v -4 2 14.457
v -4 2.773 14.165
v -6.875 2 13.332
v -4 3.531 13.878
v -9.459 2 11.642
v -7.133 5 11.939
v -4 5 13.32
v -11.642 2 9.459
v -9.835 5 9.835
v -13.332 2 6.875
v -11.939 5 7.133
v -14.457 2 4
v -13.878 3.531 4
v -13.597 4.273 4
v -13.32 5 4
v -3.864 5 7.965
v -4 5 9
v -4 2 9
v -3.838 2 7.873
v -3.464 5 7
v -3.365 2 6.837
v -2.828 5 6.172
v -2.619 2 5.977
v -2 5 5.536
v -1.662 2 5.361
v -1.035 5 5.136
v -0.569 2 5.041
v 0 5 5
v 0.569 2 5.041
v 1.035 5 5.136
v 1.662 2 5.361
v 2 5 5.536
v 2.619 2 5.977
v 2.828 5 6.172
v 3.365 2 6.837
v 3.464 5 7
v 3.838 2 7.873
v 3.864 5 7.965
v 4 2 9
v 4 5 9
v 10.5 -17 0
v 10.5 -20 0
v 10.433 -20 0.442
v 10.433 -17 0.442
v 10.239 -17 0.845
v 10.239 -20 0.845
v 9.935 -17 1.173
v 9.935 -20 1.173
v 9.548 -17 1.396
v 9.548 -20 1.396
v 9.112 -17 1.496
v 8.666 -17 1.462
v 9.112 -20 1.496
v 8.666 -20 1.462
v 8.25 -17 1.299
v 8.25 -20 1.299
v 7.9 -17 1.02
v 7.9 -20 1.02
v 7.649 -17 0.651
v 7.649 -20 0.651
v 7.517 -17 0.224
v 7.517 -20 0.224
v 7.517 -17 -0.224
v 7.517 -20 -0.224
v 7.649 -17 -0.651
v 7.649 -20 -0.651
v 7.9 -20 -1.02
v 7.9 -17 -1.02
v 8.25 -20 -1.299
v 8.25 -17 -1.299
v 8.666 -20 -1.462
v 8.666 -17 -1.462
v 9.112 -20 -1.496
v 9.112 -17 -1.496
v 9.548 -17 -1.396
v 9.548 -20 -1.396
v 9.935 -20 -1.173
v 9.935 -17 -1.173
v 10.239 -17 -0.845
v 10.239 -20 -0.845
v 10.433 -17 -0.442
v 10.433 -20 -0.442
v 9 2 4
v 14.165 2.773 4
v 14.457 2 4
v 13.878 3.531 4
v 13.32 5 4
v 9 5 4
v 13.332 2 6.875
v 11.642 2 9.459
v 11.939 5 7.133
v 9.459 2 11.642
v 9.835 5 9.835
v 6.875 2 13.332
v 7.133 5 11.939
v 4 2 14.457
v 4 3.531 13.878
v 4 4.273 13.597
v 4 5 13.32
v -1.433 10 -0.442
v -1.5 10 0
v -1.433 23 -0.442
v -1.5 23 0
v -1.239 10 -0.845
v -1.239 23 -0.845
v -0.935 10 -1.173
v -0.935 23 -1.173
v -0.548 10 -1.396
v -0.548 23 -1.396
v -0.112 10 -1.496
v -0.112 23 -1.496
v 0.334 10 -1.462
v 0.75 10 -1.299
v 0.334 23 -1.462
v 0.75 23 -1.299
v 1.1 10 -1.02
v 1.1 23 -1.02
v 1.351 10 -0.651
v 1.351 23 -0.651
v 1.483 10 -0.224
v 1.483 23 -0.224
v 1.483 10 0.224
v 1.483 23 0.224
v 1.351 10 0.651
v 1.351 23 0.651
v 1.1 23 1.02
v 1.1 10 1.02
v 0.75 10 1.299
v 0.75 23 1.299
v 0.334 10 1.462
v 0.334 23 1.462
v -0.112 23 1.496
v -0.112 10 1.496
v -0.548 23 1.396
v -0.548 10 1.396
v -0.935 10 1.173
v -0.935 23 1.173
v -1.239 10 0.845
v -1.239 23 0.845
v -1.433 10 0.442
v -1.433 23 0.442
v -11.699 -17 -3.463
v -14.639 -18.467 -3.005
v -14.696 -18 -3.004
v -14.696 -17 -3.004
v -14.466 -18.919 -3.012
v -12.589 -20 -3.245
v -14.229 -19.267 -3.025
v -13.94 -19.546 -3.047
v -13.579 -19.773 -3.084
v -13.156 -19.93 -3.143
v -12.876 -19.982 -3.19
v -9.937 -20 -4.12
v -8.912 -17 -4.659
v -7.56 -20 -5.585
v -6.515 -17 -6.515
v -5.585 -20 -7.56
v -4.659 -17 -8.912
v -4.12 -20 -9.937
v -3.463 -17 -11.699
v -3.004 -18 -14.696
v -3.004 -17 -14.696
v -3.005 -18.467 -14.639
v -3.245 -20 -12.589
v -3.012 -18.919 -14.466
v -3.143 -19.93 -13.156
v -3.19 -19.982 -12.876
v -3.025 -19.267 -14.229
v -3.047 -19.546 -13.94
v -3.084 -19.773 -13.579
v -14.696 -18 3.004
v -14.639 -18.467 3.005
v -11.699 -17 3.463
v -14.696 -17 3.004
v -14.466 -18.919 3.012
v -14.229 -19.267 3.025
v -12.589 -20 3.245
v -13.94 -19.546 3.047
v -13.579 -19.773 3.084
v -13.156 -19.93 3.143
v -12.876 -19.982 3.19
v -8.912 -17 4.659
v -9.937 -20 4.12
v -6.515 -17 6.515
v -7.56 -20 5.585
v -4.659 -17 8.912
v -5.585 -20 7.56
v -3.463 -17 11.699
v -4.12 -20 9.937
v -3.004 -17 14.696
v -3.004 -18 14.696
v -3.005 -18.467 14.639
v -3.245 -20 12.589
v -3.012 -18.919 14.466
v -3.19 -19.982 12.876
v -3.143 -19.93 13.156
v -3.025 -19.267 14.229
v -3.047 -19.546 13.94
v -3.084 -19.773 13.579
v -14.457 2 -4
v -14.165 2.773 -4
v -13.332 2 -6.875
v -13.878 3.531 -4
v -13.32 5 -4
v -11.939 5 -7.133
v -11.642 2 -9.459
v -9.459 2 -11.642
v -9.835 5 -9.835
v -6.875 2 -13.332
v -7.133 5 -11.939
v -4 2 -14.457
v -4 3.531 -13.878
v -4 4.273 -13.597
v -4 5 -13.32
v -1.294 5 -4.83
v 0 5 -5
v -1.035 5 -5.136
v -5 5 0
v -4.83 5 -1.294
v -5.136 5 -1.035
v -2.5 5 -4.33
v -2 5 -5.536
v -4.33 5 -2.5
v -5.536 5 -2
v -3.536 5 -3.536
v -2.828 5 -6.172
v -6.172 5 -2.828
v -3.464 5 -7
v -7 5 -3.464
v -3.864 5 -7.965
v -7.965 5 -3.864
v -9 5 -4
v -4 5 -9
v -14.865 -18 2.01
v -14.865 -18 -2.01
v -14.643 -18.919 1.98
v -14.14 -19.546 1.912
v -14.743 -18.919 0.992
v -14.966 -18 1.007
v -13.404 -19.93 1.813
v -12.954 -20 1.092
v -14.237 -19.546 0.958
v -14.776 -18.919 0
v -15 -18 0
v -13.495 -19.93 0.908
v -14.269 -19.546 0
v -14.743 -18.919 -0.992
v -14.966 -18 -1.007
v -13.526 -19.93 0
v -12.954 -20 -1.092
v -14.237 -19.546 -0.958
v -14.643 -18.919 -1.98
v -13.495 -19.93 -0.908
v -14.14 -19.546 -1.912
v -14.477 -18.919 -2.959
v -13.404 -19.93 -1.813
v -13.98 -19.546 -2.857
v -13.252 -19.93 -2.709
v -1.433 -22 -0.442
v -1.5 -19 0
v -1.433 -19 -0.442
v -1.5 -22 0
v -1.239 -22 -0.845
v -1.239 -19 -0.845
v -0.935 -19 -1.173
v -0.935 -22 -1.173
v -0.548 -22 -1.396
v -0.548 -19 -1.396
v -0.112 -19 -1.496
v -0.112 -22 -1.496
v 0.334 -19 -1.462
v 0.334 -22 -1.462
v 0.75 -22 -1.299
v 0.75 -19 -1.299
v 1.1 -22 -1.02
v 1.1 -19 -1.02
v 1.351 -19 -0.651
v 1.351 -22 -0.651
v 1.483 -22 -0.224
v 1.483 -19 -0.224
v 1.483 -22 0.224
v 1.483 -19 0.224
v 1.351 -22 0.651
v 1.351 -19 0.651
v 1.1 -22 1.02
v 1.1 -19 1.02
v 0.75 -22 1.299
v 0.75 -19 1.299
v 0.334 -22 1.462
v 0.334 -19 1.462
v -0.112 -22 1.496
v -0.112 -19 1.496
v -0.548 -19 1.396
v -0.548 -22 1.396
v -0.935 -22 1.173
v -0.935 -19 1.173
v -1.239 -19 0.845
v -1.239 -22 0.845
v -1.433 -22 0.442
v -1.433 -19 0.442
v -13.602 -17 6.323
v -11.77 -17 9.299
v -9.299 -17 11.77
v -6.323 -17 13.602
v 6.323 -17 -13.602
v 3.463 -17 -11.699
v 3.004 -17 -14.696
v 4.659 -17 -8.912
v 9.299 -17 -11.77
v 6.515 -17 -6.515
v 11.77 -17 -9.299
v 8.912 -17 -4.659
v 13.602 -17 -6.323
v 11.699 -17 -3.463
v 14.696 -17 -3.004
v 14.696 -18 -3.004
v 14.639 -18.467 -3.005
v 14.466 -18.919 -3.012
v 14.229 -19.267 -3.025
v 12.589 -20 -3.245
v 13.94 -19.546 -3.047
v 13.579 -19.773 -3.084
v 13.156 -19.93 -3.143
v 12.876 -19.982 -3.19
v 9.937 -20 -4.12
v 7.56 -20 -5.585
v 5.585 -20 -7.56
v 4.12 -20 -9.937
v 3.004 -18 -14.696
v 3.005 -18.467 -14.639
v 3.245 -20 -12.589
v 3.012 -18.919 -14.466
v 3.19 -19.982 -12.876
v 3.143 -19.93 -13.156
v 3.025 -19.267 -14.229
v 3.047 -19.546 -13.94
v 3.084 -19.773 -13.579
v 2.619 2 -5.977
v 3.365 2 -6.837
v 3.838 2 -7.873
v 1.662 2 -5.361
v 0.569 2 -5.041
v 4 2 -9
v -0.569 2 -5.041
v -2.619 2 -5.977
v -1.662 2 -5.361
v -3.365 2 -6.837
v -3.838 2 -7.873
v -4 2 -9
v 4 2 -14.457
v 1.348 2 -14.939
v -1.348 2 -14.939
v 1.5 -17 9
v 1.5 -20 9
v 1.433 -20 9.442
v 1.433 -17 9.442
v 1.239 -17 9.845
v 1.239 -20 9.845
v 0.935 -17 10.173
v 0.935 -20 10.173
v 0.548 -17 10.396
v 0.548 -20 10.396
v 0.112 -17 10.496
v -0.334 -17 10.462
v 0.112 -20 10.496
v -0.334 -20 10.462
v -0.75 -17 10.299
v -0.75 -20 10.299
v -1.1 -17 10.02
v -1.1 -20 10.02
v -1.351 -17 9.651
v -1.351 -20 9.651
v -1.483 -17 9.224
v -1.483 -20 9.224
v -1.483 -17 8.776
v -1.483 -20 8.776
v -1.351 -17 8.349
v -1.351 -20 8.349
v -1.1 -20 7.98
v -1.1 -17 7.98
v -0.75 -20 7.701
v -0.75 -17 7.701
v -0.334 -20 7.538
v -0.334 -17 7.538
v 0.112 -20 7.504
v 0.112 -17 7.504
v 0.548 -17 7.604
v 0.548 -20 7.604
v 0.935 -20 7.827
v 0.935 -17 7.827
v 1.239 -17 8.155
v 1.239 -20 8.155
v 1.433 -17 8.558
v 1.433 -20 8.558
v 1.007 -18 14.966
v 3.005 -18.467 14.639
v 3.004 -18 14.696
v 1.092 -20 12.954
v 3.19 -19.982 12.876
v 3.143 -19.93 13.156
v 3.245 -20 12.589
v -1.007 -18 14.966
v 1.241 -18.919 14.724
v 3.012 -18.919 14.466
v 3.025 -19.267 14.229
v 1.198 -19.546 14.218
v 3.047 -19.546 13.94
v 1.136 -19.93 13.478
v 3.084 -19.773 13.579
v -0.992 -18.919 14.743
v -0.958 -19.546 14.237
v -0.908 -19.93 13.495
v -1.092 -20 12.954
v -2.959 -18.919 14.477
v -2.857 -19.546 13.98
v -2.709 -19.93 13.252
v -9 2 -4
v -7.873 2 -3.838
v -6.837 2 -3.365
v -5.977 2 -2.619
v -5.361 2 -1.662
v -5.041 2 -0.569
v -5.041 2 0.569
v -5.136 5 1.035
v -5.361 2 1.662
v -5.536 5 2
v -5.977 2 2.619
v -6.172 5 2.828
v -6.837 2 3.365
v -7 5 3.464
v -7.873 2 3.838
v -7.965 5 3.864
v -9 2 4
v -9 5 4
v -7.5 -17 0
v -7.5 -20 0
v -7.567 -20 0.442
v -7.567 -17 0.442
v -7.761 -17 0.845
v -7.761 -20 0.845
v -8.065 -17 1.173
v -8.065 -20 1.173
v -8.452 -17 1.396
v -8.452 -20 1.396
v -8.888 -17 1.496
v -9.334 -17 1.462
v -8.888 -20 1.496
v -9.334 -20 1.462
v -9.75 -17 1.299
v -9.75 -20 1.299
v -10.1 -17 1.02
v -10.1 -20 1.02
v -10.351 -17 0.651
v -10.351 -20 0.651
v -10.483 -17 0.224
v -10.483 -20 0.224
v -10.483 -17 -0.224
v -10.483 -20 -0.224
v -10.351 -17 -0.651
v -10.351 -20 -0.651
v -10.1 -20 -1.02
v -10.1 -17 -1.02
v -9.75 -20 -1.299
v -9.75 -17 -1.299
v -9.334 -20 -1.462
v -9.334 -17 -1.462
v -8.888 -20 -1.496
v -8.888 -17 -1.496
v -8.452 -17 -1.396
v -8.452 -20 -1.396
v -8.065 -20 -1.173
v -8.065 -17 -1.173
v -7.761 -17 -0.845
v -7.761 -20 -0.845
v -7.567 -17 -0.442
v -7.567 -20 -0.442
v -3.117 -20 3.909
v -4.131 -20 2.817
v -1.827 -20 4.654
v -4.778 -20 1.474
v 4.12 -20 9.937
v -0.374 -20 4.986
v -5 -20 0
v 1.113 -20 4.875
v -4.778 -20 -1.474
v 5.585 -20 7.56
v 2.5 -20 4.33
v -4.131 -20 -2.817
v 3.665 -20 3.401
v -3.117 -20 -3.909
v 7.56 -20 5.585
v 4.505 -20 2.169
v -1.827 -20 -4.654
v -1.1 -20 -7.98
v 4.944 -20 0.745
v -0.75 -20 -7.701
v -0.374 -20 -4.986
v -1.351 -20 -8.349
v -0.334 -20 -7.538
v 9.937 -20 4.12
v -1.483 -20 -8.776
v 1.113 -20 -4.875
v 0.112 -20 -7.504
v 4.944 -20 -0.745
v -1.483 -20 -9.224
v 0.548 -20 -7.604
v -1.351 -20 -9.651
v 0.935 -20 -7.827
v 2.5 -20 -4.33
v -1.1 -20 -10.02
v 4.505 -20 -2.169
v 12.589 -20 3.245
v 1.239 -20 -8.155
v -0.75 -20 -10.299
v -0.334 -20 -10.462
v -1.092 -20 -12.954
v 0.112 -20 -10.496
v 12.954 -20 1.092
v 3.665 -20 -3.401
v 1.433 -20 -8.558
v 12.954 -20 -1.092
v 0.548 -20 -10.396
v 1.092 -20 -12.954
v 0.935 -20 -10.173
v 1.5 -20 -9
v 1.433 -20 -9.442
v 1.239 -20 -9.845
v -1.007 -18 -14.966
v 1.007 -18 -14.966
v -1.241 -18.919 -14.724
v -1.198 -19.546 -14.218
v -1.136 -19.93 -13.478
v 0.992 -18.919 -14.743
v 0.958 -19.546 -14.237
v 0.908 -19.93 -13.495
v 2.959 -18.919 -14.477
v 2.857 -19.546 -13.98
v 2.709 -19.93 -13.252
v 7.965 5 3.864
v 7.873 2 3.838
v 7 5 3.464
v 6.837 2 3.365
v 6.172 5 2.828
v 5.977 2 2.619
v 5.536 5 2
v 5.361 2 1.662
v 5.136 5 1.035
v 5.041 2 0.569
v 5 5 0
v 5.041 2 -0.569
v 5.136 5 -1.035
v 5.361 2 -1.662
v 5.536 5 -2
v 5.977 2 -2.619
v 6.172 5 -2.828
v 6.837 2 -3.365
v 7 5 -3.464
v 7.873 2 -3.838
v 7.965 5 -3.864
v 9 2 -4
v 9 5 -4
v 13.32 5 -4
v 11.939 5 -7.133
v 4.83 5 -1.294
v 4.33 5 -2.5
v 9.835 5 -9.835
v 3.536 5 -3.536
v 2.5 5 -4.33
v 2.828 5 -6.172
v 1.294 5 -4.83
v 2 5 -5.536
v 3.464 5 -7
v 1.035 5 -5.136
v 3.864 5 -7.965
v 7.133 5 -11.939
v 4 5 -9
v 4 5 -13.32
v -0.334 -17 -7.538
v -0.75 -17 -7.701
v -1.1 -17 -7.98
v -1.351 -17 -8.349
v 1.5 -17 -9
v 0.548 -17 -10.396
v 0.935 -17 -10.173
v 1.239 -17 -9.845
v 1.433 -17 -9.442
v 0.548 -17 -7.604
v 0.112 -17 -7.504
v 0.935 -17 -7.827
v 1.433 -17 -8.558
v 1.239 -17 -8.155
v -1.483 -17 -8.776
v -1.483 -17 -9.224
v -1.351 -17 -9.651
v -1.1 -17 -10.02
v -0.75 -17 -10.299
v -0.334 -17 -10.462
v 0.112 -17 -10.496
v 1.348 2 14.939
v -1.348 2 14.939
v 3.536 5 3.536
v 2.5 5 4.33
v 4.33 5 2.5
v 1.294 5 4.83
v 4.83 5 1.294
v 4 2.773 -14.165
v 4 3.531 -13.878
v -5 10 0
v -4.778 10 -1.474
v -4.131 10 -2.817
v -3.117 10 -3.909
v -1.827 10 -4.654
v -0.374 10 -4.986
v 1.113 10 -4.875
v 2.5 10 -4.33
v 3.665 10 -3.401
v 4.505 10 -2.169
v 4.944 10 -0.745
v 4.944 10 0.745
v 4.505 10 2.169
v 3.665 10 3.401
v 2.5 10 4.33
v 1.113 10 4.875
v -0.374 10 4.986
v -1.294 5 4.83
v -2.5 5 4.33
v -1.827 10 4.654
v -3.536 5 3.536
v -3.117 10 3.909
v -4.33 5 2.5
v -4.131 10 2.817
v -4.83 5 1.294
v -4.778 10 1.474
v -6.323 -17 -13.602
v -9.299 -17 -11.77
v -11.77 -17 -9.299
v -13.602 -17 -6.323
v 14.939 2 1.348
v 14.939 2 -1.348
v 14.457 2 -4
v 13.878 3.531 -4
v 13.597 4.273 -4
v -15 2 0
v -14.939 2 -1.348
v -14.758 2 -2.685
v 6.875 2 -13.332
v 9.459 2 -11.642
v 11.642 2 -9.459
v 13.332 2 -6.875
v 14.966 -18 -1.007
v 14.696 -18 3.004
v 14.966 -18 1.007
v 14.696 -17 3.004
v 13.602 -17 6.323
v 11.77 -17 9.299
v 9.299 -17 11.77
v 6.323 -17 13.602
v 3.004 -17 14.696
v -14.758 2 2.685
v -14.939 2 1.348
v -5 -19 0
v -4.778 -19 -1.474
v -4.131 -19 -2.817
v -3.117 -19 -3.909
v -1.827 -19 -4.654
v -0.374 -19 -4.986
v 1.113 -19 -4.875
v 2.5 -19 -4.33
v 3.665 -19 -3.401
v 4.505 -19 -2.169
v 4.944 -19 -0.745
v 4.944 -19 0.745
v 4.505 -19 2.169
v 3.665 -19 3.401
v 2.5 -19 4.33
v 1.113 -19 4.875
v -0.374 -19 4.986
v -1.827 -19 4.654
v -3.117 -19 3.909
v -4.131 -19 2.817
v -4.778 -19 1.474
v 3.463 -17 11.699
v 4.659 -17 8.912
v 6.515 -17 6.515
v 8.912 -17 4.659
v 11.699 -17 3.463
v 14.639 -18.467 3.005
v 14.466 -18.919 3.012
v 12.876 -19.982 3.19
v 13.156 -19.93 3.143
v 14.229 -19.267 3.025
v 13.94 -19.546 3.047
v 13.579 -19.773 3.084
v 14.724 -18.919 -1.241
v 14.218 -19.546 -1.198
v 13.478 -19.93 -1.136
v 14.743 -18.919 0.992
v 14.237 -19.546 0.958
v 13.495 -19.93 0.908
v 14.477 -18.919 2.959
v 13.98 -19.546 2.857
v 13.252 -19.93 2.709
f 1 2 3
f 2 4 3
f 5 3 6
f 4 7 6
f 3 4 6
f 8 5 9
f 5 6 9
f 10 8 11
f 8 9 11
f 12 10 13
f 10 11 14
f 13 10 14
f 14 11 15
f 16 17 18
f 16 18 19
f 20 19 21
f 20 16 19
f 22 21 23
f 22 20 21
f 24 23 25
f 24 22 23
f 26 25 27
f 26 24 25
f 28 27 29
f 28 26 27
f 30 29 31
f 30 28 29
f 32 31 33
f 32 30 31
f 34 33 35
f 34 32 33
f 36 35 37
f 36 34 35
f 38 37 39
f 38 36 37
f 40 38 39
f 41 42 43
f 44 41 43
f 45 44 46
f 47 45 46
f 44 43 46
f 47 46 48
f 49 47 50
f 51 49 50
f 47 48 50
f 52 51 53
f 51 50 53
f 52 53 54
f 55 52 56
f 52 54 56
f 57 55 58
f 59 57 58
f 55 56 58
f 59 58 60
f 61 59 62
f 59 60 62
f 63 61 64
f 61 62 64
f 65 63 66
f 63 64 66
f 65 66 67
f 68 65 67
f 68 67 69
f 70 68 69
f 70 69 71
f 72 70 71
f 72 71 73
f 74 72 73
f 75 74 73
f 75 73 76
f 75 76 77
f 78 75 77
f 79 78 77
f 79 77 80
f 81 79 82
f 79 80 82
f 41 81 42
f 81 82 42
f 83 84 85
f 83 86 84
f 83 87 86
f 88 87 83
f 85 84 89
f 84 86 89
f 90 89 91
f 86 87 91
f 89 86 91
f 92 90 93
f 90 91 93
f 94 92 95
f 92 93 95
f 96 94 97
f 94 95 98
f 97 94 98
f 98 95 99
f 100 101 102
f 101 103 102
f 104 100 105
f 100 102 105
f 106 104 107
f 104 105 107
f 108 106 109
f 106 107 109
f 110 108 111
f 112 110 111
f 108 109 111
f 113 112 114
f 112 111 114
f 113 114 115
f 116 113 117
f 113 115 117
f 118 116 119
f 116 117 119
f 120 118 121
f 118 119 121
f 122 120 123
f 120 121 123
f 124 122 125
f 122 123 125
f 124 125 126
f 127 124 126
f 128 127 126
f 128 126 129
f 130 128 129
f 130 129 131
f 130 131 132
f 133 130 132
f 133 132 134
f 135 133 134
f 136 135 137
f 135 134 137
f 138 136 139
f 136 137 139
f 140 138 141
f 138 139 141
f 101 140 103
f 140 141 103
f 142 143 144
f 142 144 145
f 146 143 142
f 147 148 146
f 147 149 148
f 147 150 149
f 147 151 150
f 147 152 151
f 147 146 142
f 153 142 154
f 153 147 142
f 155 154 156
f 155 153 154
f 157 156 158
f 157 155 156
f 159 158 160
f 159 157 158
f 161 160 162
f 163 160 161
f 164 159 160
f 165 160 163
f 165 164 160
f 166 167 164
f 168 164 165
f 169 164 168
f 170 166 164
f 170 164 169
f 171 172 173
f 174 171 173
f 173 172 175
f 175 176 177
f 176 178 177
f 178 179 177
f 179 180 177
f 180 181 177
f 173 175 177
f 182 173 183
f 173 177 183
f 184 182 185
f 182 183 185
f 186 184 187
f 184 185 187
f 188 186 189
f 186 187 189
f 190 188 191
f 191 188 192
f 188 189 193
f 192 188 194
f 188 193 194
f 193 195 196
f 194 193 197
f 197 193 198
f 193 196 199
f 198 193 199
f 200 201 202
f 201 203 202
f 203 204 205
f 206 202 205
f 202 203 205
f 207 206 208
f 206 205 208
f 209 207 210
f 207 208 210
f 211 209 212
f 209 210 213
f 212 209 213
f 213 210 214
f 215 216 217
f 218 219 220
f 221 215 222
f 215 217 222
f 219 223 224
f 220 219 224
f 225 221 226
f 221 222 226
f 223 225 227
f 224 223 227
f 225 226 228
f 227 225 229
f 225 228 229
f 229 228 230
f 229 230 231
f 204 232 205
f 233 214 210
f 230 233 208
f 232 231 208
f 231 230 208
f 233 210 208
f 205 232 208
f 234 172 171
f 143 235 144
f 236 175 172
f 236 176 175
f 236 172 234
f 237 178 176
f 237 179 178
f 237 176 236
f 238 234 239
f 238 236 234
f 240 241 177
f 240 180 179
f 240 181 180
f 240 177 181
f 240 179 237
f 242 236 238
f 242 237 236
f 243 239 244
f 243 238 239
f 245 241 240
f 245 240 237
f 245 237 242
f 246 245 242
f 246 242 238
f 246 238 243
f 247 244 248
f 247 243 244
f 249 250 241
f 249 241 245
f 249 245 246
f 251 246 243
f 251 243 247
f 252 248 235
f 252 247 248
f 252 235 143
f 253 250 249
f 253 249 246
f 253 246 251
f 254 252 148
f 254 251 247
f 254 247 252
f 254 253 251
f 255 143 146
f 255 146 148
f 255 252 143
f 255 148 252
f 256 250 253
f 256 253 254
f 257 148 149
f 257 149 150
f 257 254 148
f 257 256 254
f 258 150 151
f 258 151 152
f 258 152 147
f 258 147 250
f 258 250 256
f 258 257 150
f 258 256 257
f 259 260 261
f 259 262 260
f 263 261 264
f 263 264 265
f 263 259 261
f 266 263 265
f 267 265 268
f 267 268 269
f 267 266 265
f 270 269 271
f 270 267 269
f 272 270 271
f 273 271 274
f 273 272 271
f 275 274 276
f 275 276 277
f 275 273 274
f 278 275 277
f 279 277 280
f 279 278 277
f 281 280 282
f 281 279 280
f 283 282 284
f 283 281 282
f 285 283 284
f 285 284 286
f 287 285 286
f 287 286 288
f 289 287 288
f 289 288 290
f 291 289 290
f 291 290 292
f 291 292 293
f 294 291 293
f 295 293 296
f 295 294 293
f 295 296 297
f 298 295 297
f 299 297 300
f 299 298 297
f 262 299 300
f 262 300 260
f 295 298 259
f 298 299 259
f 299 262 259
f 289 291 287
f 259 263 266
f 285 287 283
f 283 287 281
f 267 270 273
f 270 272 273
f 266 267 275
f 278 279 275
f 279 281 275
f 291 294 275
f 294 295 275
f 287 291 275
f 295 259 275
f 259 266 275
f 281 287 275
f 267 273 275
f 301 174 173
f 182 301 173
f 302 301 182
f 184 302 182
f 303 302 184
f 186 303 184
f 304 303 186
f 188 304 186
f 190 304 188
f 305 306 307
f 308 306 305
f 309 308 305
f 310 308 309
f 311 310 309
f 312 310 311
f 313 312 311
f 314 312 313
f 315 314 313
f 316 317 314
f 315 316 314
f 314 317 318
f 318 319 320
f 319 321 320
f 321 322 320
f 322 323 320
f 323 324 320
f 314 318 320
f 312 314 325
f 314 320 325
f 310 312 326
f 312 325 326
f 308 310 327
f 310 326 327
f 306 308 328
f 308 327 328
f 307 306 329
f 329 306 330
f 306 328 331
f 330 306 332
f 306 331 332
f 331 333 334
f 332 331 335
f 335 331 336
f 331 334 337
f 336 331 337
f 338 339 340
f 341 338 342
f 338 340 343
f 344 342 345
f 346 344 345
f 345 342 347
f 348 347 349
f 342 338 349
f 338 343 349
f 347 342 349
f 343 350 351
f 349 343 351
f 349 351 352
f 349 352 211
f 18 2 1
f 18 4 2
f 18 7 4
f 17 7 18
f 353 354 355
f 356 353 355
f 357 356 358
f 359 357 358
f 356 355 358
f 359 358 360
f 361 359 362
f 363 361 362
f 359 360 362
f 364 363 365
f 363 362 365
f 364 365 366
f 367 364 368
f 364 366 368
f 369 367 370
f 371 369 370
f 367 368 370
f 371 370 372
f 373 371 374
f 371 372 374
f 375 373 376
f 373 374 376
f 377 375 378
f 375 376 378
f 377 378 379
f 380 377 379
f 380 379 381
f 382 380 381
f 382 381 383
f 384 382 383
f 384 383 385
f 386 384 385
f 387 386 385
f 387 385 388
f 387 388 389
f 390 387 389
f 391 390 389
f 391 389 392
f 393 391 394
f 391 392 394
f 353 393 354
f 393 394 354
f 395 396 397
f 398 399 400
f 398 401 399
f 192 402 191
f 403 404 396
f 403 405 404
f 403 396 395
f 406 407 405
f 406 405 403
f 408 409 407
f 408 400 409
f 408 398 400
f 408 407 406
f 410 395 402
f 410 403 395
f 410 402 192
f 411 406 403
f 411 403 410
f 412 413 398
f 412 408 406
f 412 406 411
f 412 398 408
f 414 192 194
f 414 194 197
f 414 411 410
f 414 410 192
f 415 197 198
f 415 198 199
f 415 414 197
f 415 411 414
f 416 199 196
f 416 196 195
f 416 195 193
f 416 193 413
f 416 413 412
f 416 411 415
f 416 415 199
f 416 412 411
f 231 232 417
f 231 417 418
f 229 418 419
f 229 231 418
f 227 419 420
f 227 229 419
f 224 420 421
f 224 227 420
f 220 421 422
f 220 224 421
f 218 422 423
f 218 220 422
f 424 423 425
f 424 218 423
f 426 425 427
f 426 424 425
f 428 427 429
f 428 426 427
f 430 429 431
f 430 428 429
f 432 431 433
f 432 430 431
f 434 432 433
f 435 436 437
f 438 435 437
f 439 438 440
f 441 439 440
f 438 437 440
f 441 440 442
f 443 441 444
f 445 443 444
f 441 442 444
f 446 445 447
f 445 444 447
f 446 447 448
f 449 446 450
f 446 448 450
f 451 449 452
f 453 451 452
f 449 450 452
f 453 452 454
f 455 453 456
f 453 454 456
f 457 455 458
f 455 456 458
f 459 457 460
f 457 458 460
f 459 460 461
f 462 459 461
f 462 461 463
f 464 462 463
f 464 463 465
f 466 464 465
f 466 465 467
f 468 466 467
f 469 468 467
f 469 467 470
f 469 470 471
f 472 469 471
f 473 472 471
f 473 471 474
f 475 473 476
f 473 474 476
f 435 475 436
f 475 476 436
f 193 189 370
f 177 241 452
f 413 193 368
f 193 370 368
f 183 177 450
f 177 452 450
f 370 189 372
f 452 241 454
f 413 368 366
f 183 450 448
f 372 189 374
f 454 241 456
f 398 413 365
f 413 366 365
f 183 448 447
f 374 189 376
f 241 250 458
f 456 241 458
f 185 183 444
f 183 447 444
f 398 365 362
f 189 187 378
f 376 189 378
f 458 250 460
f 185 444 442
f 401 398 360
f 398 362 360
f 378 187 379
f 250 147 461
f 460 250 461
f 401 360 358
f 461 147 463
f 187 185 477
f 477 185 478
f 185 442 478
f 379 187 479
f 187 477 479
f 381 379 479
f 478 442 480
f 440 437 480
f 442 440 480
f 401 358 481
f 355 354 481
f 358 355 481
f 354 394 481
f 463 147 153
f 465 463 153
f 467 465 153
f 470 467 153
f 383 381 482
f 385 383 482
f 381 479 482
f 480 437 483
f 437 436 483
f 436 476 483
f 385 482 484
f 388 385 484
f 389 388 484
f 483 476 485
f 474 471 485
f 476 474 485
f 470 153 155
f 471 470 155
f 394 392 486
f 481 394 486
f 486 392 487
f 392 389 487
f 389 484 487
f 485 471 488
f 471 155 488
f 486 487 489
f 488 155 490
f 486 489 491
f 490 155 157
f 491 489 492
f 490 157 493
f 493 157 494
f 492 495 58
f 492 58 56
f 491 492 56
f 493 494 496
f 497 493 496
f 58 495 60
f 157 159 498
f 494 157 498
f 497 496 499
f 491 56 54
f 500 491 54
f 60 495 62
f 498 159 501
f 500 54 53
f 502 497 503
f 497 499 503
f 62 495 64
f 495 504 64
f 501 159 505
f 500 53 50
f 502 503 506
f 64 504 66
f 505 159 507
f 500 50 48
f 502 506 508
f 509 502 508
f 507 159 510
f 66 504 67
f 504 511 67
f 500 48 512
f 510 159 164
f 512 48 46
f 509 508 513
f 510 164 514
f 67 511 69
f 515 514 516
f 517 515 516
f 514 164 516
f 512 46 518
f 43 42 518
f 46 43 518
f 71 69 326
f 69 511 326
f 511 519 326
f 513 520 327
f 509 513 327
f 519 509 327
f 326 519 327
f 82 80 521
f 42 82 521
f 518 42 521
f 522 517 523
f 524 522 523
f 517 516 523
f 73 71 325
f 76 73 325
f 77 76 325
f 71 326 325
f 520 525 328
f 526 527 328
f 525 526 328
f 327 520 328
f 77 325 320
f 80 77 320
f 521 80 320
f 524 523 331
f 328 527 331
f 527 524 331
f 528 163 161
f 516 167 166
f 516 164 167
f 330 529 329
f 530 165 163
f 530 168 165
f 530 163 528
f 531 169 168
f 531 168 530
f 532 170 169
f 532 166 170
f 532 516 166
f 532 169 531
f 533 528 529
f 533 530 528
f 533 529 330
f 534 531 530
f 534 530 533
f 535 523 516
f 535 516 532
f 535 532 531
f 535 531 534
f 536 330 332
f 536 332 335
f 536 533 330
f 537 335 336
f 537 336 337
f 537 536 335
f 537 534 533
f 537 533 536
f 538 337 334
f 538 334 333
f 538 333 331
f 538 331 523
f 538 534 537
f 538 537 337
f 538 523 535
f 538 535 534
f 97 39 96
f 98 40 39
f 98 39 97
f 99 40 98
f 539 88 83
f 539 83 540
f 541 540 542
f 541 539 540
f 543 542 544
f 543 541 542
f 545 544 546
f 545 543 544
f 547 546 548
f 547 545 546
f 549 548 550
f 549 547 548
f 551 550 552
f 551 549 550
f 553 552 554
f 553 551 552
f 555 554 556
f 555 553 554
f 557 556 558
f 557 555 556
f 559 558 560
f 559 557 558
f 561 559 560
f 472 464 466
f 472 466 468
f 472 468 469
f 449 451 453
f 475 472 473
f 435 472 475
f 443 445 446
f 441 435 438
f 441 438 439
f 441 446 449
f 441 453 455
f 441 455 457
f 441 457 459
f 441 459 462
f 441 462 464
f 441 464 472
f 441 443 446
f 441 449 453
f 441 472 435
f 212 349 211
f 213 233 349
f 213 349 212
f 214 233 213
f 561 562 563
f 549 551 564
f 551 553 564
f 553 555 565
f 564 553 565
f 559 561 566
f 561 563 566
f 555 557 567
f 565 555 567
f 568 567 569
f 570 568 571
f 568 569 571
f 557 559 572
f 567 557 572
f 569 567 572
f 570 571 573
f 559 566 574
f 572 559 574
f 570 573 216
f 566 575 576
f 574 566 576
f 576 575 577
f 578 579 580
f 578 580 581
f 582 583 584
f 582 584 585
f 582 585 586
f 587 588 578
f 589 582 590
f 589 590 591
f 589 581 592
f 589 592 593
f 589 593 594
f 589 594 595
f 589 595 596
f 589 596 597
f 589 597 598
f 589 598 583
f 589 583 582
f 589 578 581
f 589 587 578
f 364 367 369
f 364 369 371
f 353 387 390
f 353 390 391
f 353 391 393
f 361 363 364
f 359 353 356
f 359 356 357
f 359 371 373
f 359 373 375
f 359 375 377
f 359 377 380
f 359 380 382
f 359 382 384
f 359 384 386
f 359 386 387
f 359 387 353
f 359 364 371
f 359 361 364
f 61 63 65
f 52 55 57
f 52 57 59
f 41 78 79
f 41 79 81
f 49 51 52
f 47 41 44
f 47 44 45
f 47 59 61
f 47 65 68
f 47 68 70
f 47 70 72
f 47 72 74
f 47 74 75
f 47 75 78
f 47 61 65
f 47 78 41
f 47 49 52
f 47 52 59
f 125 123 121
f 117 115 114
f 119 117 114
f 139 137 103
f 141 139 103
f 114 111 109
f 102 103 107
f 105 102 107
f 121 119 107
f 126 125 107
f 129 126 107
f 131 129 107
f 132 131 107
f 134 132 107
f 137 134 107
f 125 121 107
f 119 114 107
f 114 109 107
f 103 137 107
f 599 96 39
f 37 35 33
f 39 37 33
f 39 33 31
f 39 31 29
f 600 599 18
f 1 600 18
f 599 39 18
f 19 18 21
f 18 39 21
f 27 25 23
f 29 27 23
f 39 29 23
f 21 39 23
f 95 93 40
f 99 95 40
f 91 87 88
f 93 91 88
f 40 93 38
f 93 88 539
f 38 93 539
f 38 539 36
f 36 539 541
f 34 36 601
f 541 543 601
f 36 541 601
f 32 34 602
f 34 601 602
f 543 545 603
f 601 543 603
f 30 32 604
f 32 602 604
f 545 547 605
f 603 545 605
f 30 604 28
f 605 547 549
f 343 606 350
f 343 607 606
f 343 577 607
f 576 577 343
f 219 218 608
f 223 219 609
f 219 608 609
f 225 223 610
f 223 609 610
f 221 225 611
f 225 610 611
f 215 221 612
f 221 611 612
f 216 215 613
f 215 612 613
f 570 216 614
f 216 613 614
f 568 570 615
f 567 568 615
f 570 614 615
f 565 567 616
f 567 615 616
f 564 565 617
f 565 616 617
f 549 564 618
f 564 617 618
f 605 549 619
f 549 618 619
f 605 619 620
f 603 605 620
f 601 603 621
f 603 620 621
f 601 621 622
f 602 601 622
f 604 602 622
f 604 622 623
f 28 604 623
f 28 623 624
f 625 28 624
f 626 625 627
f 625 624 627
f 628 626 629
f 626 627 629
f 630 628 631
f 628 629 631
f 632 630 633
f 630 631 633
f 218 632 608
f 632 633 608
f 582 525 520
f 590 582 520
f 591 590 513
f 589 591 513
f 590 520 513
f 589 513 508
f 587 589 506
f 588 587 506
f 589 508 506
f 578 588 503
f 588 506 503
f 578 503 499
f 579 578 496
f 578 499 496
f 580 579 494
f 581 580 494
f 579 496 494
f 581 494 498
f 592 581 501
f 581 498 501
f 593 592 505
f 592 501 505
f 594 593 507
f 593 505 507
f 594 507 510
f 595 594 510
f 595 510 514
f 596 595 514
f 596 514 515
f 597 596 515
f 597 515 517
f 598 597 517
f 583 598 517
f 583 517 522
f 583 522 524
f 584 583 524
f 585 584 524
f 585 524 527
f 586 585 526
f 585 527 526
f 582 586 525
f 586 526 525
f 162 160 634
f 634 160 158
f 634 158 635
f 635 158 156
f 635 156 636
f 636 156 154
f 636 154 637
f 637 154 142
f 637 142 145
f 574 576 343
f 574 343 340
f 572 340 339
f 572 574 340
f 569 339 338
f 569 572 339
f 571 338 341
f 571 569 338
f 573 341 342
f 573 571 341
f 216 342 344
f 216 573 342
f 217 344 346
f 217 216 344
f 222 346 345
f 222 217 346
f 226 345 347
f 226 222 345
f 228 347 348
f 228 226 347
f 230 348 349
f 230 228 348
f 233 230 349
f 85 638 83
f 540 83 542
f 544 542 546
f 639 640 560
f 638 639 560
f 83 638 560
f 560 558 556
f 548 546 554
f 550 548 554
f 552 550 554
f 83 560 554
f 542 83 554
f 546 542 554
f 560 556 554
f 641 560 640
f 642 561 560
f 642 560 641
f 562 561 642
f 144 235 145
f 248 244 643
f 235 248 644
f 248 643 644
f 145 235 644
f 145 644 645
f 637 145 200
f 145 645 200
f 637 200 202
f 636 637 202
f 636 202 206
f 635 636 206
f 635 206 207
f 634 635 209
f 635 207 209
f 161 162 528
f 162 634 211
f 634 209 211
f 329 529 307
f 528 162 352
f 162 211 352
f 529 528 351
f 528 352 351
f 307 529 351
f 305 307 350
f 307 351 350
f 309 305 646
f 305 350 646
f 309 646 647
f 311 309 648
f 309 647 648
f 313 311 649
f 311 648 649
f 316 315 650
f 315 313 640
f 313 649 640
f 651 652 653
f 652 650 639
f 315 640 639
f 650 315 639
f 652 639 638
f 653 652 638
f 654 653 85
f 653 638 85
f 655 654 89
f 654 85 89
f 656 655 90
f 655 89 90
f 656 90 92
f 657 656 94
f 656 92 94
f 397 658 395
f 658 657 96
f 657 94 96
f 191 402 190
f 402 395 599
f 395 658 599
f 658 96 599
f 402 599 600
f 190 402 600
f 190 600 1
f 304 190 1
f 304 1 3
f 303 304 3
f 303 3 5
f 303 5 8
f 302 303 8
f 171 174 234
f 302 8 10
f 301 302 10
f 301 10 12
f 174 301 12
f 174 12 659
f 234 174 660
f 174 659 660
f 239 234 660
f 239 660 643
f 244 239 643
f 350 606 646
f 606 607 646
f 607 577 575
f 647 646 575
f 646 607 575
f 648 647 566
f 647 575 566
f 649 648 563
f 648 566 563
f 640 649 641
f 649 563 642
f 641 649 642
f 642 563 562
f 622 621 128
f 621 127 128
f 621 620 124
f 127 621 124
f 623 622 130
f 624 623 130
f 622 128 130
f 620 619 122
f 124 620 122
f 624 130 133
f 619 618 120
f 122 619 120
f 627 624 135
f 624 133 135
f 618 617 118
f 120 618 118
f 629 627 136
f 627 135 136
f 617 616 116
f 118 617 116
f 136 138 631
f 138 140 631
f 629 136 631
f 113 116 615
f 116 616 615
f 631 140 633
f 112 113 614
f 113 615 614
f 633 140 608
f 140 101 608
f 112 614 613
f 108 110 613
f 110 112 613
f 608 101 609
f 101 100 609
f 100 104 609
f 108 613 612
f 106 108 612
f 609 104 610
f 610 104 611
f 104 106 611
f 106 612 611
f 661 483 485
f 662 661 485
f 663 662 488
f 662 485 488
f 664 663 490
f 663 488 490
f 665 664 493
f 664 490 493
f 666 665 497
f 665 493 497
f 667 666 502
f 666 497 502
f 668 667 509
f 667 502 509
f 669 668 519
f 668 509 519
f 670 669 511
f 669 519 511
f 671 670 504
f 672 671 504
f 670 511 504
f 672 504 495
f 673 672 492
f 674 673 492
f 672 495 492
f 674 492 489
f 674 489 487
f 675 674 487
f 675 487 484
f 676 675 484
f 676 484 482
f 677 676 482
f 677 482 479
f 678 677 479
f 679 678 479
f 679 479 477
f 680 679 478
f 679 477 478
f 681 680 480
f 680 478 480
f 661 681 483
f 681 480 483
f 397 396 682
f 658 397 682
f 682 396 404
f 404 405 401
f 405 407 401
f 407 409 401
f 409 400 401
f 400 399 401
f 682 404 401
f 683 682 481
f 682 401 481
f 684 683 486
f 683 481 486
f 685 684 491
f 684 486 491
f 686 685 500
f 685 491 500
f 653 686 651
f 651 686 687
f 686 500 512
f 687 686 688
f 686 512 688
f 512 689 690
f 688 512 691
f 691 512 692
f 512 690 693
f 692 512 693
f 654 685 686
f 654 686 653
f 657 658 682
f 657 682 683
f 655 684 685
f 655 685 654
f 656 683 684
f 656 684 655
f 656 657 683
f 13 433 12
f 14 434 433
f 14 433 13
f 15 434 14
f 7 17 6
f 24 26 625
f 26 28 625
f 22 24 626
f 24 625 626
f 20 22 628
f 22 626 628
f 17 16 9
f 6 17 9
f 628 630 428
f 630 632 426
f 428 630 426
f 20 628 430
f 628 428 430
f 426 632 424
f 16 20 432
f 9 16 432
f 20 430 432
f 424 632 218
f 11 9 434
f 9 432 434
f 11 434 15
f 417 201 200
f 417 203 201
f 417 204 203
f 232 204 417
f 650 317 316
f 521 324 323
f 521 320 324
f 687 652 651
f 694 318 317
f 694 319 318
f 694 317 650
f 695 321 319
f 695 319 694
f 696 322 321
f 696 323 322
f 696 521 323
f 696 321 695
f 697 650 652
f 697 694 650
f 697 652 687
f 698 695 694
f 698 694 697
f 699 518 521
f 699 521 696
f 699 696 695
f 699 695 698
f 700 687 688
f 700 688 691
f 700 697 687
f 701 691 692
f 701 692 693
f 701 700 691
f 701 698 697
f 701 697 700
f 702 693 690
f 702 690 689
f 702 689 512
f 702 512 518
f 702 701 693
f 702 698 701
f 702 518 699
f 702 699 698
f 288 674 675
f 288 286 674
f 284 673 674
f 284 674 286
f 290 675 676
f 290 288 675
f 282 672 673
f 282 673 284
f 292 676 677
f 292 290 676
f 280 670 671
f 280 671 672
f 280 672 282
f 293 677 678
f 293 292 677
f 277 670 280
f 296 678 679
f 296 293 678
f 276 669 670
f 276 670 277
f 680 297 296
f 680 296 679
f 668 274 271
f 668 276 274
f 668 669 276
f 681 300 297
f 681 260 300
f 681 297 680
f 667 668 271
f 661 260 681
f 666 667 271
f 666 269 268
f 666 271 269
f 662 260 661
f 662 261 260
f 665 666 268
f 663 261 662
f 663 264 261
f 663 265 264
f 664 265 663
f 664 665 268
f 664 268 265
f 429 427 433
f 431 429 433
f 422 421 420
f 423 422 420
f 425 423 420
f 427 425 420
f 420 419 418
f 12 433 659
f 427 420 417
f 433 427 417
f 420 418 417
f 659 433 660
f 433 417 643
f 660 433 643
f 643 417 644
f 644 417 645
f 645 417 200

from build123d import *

# Parameters (mm, degrees)
CHANFREIN1_SIZE         = 3
CHANFREIN1_SIZE2        = 1.091910703
CONG_1_R                = 2
ENL_V_MAT_EXTRU_1_DEPTH = 3
ESQUISSE3_R             = 1.5
ENL_V_MAT_EXTRU_2_DEPTH = 3
ESQUISSE4_R             = 5
ESQUISSE4_R_2           = 1.5
ENL_V_MAT_EXTRU_3_DEPTH = 1


with BuildPart() as part:
    # Esquisse1 → Révolution1 (revolve)
    with BuildSketch(Plane.XY):
        Polygon((0, 23), (0, -20), (0, -22), (-1.5, -22), (-1.5, -20), (-15, -20), (-15, 5), (-5, 5), (-5, 10), (-1.5, 10), (-1.5, 23), align=None)
    revolve(axis=Axis((0, 23, 0), (0, -1, 0)))

    # Chanfrein1
    chanfrein1_edges = [part.edges().sort_by_distance(p)[0] for p in [
        (15, 5, 0),
    ]]
    chanfrein1_side = [part.faces().sort_by_distance(p)[0] for p in [
        (15, -7.5, 0),
    ]]
    chamfer(chanfrein1_edges, length=CHANFREIN1_SIZE, length2=CHANFREIN1_SIZE2, reference=chanfrein1_side[0])

    # Congé1
    cong_1_edges = [part.edges().sort_by_distance(p)[0] for p in [
        (15, -20, 0),
    ]]
    fillet(cong_1_edges, radius=CONG_1_R)

    # Esquisse2 → Enlèv. mat.-Extru.1 (cut)
    with BuildSketch(Plane(origin=(0, 5, 0), x_dir=(1, 0, 0), z_dir=(0, 1, 0))):
        with BuildLine():
            Line((-4, 9), (-4, 19))
            Line((-4, 19), (4, 19))
            Line((4, 19), (4, 9))
            ThreePointArc((4, 9), (0, 5), (-4, 9))
        make_face()
        with BuildLine():
            Line((9, 4), (19, 4))
            Line((19, 4), (19, -4))
            Line((19, -4), (9, -4))
            ThreePointArc((9, -4), (5, 0), (9, 4))
        make_face()
        with BuildLine():
            Line((4, -9), (4, -19))
            Line((4, -19), (-4, -19))
            Line((-4, -19), (-4, -9))
            ThreePointArc((-4, -9), (0, -5), (4, -9))
        make_face()
        with BuildLine():
            Line((-9, -4), (-19, -4))
            Line((-19, -4), (-19, 4))
            Line((-19, 4), (-9, 4))
            ThreePointArc((-9, 4), (-5, 0), (-9, -4))
        make_face()
    extrude(amount=-ENL_V_MAT_EXTRU_1_DEPTH, mode=Mode.SUBTRACT)

    # Esquisse3 → Enlèv. mat.-Extru.2 (cut)
    with BuildSketch(Plane.XZ.offset(20)):
        with Locations((0, 9)):
            Circle(ESQUISSE3_R)
        with Locations((0, -9)):
            Circle(ESQUISSE3_R)
        with Locations((9, 0)):
            Circle(ESQUISSE3_R)
        with Locations((-9, 0)):
            Circle(ESQUISSE3_R)
        with BuildLine():
            ThreePointArc((-15, 3), (-6.514718626, 6.514718626), (-3, 15))
            ThreePointArc((-3, 15), (-12.991965185, 12.991965185), (-15, 3))
        make_face()
        with BuildLine():
            ThreePointArc((3, 15), (6.514718626, 6.514718626), (15, 3))
            ThreePointArc((15, 3), (12.889510499, 12.889510499), (3, 15))
        make_face()
        with BuildLine():
            ThreePointArc((15, -3), (6.514718626, -6.514718626), (3, -15))
            ThreePointArc((3, -15), (12.652903184, -12.652903184), (15, -3))
        make_face()
        with BuildLine():
            ThreePointArc((-15, -3), (-6.514718626, -6.514718626), (-3, -15))
            ThreePointArc((-3, -15), (-12.726788918, -12.726788918), (-15, -3))
        make_face()
    extrude(amount=-ENL_V_MAT_EXTRU_2_DEPTH, mode=Mode.SUBTRACT)

    # Esquisse4 → Enlèv. mat.-Extru.3 (cut)
    with BuildSketch(Plane.XZ.offset(20)):
        with Locations(Location((0, 0, 0), (0, 0, 180))):
            Circle(ESQUISSE4_R)
        with Locations(Location((0, 0, 0), (0, 0, 180))):
            Circle(ESQUISSE4_R_2, mode=Mode.SUBTRACT)
    extrude(amount=-ENL_V_MAT_EXTRU_3_DEPTH, mode=Mode.SUBTRACT)


solid = part.part
